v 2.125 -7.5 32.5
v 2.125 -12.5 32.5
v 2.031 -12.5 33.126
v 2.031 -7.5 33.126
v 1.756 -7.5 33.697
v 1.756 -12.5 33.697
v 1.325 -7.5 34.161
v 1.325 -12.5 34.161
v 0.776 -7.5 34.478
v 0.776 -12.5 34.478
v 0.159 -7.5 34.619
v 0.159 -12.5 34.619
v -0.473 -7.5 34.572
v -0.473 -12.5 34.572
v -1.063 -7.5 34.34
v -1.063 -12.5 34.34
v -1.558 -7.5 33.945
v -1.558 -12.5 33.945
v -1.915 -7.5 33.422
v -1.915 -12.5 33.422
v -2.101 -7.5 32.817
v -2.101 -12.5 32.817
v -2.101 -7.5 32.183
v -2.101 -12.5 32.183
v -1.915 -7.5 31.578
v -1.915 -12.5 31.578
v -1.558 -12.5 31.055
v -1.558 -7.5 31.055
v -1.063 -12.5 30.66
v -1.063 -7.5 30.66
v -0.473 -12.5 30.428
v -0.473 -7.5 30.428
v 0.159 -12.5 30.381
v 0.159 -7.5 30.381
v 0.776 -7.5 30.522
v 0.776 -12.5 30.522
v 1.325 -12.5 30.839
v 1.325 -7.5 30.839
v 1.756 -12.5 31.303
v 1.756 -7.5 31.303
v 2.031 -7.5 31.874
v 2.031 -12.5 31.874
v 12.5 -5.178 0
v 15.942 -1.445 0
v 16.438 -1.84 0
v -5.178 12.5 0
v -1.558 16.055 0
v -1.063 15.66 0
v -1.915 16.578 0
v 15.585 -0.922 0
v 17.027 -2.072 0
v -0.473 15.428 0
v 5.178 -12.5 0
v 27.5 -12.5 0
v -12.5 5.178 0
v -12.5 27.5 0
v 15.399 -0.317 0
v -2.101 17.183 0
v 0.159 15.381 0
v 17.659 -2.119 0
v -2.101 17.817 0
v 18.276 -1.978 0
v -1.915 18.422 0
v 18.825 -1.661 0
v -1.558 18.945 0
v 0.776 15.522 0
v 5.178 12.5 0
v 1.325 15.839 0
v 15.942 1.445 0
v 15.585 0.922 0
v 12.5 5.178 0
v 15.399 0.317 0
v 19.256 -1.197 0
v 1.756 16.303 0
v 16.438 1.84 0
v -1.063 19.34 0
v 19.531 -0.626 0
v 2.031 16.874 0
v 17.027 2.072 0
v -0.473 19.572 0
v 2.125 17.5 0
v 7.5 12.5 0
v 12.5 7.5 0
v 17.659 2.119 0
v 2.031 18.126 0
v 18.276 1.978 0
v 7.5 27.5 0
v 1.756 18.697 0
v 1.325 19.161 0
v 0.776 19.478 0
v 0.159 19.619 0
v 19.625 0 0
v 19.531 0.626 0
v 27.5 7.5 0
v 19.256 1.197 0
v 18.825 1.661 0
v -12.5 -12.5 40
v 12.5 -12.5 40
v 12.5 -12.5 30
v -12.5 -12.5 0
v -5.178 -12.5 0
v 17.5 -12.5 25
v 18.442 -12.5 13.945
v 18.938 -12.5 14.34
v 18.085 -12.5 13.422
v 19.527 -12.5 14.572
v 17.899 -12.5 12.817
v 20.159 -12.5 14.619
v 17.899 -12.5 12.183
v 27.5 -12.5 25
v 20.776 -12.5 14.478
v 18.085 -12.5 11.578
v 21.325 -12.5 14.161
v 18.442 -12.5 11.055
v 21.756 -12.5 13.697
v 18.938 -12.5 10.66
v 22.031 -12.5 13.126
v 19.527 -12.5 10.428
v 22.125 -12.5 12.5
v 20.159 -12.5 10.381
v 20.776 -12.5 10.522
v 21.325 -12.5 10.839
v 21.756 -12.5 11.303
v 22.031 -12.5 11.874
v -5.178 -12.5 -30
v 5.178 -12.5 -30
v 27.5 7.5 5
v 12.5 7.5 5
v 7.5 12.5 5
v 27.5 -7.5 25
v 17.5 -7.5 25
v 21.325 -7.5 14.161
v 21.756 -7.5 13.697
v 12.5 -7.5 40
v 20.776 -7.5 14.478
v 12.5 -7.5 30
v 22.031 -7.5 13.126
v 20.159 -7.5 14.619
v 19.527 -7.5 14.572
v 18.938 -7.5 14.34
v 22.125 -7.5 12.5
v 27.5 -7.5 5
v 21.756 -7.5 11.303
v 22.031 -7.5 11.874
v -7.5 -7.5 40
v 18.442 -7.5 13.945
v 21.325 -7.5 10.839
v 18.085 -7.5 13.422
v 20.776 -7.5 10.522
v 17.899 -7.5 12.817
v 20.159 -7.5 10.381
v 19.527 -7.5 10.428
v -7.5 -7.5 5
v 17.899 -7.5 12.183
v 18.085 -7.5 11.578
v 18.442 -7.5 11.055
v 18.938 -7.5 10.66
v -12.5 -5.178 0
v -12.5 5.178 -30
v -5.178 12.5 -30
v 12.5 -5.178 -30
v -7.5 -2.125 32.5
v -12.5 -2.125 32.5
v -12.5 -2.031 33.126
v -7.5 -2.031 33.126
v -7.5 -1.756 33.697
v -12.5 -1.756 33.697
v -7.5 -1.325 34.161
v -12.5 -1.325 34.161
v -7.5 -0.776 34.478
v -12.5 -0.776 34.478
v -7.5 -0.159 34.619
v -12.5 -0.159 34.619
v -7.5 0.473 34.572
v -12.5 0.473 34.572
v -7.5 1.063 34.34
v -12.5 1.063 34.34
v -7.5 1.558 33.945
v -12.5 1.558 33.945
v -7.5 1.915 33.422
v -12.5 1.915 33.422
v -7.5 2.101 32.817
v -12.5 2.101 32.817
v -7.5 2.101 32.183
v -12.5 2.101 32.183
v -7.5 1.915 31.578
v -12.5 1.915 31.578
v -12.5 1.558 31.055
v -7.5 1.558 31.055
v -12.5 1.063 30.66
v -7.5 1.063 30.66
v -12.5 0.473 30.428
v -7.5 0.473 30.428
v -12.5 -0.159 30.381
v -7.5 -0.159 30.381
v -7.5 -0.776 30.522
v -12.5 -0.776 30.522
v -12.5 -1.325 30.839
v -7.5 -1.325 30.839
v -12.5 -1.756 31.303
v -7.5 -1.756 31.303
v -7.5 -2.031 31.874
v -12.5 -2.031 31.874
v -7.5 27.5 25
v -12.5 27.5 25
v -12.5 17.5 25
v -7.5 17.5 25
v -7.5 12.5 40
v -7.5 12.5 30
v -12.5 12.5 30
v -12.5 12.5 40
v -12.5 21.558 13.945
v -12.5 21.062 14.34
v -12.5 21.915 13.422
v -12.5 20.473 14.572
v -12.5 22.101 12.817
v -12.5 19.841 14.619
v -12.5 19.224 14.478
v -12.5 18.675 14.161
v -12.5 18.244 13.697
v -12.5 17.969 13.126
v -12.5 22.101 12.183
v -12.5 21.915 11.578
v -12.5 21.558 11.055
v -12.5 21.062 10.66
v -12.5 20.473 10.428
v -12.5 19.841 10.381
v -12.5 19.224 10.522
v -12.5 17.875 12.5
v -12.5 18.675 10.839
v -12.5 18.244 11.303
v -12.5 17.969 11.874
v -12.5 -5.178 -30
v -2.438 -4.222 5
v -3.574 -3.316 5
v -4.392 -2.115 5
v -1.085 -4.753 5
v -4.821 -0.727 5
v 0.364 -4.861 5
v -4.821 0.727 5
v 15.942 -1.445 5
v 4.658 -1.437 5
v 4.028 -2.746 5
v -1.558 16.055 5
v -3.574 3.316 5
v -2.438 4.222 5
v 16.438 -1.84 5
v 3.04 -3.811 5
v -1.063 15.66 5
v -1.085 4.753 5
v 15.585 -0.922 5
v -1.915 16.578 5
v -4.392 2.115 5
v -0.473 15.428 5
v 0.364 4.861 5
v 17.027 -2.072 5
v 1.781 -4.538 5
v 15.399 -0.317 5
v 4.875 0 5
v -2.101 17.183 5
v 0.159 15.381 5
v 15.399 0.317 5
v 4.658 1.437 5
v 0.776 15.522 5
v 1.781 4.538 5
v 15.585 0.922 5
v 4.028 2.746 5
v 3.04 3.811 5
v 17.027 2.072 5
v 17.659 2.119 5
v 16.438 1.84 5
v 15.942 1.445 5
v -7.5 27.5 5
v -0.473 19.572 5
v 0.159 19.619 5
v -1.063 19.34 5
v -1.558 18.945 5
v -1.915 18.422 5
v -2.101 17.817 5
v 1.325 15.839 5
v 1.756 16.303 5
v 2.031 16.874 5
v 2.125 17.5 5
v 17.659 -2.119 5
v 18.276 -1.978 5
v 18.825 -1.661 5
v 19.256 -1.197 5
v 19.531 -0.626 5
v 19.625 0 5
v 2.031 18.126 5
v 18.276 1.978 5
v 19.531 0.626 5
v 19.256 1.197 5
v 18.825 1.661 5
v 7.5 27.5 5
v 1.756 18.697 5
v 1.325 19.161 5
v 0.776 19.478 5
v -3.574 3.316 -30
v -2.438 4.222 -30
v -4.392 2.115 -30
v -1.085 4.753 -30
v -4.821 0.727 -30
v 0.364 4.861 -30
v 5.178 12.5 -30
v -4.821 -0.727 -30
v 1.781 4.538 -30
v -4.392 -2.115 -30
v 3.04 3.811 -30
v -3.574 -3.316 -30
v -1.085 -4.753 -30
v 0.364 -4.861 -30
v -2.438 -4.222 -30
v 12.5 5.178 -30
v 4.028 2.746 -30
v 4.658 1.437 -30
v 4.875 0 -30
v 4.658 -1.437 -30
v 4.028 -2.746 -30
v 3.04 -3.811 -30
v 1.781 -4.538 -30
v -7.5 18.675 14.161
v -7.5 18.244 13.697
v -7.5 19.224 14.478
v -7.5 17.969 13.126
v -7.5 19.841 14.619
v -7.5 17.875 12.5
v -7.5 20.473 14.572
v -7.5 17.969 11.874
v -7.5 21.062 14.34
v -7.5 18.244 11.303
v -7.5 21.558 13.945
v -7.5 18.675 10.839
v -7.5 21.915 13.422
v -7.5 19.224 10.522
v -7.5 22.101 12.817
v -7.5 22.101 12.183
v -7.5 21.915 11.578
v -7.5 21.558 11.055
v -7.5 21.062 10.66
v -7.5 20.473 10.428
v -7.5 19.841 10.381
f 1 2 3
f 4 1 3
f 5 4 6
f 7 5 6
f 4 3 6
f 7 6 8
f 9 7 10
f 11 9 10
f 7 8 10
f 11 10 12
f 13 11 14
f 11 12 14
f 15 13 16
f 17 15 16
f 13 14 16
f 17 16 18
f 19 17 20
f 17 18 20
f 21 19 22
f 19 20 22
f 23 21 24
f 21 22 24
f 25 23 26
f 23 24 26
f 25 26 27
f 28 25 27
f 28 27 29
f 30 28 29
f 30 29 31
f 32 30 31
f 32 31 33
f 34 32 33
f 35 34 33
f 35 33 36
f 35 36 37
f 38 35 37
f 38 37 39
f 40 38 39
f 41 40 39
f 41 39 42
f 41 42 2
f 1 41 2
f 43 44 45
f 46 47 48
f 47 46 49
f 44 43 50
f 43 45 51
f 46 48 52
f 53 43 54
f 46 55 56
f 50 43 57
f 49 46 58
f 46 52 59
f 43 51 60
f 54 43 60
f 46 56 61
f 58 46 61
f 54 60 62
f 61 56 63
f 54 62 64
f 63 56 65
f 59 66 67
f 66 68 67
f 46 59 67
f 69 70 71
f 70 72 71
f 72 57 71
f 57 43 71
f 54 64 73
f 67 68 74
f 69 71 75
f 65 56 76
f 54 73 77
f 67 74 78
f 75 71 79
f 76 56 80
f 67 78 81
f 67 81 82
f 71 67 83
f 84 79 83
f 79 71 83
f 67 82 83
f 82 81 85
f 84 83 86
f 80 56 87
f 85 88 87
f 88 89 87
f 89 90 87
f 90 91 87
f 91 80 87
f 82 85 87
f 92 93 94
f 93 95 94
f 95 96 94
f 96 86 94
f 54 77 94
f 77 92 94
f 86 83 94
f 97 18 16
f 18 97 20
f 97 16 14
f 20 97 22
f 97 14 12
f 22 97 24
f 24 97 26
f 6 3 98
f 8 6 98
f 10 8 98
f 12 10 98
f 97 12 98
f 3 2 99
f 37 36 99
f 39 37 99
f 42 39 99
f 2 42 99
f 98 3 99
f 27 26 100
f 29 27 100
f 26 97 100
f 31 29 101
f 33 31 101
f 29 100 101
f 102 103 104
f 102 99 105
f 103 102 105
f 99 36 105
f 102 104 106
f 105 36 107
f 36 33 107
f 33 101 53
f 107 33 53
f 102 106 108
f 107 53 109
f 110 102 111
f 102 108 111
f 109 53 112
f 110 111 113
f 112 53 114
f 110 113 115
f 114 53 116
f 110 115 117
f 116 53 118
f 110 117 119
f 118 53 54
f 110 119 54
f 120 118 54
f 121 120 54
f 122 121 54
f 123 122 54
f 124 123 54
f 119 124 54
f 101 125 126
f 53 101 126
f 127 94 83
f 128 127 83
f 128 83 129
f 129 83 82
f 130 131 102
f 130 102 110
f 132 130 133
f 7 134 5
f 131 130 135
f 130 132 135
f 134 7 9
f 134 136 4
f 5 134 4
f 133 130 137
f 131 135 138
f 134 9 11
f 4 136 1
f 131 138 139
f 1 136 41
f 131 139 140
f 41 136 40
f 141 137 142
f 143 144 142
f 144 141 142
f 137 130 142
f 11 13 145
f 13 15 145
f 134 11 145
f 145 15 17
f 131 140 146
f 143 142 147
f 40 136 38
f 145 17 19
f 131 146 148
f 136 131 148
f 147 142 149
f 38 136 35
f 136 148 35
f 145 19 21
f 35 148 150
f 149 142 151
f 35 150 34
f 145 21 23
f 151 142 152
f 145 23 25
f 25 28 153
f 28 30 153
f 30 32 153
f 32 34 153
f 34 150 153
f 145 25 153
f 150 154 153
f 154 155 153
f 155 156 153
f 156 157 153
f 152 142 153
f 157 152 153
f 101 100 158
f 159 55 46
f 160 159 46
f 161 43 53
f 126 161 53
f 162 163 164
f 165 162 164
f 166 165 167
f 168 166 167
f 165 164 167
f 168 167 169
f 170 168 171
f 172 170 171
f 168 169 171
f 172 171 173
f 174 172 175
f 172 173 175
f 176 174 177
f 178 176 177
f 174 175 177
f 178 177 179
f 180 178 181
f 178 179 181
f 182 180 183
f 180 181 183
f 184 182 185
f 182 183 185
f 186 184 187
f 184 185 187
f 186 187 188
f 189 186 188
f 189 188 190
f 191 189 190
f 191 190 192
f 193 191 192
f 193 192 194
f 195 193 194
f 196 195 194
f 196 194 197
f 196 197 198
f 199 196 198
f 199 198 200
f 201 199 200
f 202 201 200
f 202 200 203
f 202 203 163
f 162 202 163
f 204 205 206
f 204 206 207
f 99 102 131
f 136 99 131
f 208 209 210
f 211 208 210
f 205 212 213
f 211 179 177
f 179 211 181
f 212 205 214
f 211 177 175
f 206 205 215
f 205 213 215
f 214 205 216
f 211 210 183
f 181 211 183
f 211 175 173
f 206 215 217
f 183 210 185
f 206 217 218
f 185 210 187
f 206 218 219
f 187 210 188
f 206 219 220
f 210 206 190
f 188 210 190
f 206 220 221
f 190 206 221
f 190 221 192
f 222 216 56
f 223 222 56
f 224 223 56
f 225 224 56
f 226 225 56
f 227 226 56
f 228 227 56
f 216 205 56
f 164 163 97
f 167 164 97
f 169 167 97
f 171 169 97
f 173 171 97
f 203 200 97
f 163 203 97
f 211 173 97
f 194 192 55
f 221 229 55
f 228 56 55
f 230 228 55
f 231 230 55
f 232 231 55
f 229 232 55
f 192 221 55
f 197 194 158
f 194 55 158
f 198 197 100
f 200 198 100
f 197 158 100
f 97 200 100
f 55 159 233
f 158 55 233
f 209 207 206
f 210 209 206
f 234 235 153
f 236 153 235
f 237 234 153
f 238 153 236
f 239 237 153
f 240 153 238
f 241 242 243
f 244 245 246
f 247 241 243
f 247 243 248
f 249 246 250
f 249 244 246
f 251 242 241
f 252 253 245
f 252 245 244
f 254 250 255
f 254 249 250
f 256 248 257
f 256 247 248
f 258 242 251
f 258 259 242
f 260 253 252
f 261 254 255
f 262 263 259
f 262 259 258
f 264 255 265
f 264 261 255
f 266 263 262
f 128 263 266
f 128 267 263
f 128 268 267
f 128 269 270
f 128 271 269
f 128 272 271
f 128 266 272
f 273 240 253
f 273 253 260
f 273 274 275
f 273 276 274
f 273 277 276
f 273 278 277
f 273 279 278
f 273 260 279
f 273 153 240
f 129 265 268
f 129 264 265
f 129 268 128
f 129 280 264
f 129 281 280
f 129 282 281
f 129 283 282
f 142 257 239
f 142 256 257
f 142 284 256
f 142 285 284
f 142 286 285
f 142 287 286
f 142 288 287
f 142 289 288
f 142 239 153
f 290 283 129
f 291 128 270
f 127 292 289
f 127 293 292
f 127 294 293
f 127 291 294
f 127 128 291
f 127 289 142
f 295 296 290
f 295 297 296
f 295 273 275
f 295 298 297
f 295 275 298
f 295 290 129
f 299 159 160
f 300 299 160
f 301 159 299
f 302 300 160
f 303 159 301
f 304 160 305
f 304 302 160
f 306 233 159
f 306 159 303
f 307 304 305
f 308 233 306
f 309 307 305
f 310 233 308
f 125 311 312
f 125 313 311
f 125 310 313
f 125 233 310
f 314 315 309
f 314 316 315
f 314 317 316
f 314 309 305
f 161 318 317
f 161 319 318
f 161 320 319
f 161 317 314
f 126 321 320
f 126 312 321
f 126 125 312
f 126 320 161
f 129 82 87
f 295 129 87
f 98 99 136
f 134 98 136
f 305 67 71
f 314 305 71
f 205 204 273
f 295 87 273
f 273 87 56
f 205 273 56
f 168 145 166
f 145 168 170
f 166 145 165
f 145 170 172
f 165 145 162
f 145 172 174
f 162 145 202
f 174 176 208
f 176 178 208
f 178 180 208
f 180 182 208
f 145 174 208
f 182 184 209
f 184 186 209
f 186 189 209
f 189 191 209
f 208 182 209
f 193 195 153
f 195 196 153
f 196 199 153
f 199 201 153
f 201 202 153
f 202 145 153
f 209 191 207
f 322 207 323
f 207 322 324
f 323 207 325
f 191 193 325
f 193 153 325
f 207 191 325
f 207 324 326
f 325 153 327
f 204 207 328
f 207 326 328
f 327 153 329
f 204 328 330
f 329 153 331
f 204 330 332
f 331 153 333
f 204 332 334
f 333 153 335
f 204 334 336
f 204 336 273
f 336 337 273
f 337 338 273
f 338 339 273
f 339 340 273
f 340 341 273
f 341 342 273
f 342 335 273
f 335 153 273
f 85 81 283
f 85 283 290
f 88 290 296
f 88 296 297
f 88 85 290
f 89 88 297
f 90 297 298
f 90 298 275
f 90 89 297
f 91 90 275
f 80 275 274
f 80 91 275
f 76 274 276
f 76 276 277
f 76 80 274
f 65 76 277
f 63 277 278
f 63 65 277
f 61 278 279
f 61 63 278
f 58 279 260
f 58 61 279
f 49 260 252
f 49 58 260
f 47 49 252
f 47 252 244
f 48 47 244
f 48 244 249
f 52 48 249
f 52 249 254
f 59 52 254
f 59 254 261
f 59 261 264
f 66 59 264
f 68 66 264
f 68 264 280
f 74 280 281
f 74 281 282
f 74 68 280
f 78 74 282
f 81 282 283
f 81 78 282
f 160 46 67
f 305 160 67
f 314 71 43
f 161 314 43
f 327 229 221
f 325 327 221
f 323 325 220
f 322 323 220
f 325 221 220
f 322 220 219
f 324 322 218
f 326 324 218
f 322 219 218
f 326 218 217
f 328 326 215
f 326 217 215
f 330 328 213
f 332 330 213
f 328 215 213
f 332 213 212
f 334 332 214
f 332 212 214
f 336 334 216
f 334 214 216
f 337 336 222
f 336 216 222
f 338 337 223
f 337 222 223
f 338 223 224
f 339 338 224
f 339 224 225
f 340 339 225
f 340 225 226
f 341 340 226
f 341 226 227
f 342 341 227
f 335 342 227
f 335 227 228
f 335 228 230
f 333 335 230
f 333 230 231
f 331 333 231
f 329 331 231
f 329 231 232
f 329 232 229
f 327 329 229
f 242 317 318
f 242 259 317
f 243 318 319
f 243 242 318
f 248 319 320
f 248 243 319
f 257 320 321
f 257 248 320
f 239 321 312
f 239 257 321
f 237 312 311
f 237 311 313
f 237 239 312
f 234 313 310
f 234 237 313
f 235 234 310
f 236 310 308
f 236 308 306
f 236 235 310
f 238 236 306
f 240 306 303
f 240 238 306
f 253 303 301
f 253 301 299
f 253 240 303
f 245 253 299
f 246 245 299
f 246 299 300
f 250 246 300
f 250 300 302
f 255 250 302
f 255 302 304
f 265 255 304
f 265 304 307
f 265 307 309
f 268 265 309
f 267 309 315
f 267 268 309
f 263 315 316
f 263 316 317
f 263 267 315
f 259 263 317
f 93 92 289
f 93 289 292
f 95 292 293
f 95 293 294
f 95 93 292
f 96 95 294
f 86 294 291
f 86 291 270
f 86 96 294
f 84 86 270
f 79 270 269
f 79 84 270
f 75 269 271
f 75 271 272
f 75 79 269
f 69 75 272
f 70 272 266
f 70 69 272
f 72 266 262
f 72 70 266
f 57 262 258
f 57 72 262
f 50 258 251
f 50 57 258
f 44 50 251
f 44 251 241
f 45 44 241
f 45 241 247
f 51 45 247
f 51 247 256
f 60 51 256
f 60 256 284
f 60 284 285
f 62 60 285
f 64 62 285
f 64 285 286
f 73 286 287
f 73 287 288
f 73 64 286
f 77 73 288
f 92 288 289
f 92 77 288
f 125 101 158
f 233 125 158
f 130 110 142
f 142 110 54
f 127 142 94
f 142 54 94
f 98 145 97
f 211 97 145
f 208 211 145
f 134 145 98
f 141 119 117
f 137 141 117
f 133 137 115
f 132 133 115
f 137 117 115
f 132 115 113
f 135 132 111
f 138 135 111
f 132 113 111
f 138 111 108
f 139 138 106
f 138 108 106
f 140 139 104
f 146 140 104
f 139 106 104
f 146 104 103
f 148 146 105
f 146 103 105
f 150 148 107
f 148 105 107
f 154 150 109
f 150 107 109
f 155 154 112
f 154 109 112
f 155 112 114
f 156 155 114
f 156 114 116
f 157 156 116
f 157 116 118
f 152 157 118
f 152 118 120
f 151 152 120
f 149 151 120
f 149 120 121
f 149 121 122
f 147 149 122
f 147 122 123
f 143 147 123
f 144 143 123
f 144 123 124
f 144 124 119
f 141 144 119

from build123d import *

# Parameters (mm, degrees)
F0_R        = 4.875
F0_R_2      = 2.125
F1_DEPTH    = 5
F2_R        = 4.875
F3_DEPTH    = 30
F4_T1_DEPTH = 5
F6_DEPTH    = 20
F8_DEPTH    = 15
F9_R        = 2.125
F10_DEPTH   = 40.001
F11_R       = 2.125
F12_DEPTH   = 40.001
F13_SIZE    = 5


# Not quite as in the source:
# - a fillet or chamfer that OpenCascade refuses, or shapes differently, is made with other operations: its cross-section is extruded or revolved along the edge and cut away or added


with BuildPart() as f1:
    # F0 (on Top) → F1 (new body)
    with BuildSketch(Plane.XY):
        Polygon((-12.5, 27.5), (-12.5, 0), (-12.5, -12.5), (27.5, -12.5), (27.5, 7.5), (7.5, 7.5), (7.5, 27.5), align=None)
        Circle(F0_R, mode=Mode.SUBTRACT)
        with Locations((17.5, 0)):
            Circle(F0_R_2, mode=Mode.SUBTRACT)
        with Locations((0, 17.5)):
            Circle(F0_R_2, mode=Mode.SUBTRACT)
    extrude(amount=F1_DEPTH)

    # F2 (on face) → F3 (join)
    with BuildSketch(Plane(origin=(0, 0, 0), x_dir=(1, 0, 0), z_dir=(0, 0, -1))):
        Polygon((12.5, -5.1776695297), (12.5, 5.1776695297), (5.1776695297, 12.5), (-5.1776695297, 12.5), (-12.5, 5.1776695297), (-12.5, -5.1776695297), (-5.1776695297, -12.5), (5.1776695297, -12.5), (7.5, -10.1776695297), (7.5, -7.5), (10.1776695297, -7.5), align=None)
        Circle(F2_R, mode=Mode.SUBTRACT)
        Polygon((7.5, -10.1776695297), (10.1776695297, -7.5), (7.5, -7.5), align=None)
    extrude(amount=F3_DEPTH)

    # F4: chamfer of 5 on 1 edges, made by hand

    # F4_s2 → F4_t1 (join)
    with BuildSketch(Plane.XY):
        Polygon((12.5, 7.5), (7.5, 12.5), (7.5, 7.5), align=None)
    extrude(amount=F4_T1_DEPTH)

    # F5 (on face) → F6 (join)
    with BuildSketch(Plane.XY.offset(5)):
        Polygon((-7.5, 27.5), (-12.5, 27.5), (-12.5, -12.5), (27.5, -12.5), (27.5, -7.5), (-7.5, -7.5), align=None)
    extrude(amount=F6_DEPTH)

    # F7 (on face) → F8 (join)
    with BuildSketch(Plane.XY.offset(25)):
        Polygon((-7.5, 12.5), (-12.5, 12.5), (-12.5, -12.5), (12.5, -12.5), (12.5, -7.5), (-7.5, -7.5), align=None)
    extrude(amount=F8_DEPTH)

    # F9 (on face) → F10 (cut, through all)
    with BuildSketch(Plane.XZ.offset(12.5)):
        with Locations((20, 12.5)):
            Circle(F9_R)
        with Locations((0, 32.5)):
            Circle(F9_R)
    extrude(amount=-F10_DEPTH, mode=Mode.SUBTRACT)

    # F11 (on face) → F12 (cut, through all)
    with BuildSketch(Plane(origin=(-12.5, 0, 0), x_dir=(0, -1, 0), z_dir=(-1, 0, 0))):
        with Locations((-20, 12.5)):
            Circle(F11_R)
        with Locations((0, 32.5)):
            Circle(F11_R)
    extrude(amount=-F12_DEPTH, mode=Mode.SUBTRACT)

    # F13
    f13_edges = [f1.edges().sort_by_distance(p)[0] for p in [
        (12.5, -10, 25),
        (-10, 12.5, 25),
    ]]
    chamfer(f13_edges, length=F13_SIZE)


solid = f1.part
